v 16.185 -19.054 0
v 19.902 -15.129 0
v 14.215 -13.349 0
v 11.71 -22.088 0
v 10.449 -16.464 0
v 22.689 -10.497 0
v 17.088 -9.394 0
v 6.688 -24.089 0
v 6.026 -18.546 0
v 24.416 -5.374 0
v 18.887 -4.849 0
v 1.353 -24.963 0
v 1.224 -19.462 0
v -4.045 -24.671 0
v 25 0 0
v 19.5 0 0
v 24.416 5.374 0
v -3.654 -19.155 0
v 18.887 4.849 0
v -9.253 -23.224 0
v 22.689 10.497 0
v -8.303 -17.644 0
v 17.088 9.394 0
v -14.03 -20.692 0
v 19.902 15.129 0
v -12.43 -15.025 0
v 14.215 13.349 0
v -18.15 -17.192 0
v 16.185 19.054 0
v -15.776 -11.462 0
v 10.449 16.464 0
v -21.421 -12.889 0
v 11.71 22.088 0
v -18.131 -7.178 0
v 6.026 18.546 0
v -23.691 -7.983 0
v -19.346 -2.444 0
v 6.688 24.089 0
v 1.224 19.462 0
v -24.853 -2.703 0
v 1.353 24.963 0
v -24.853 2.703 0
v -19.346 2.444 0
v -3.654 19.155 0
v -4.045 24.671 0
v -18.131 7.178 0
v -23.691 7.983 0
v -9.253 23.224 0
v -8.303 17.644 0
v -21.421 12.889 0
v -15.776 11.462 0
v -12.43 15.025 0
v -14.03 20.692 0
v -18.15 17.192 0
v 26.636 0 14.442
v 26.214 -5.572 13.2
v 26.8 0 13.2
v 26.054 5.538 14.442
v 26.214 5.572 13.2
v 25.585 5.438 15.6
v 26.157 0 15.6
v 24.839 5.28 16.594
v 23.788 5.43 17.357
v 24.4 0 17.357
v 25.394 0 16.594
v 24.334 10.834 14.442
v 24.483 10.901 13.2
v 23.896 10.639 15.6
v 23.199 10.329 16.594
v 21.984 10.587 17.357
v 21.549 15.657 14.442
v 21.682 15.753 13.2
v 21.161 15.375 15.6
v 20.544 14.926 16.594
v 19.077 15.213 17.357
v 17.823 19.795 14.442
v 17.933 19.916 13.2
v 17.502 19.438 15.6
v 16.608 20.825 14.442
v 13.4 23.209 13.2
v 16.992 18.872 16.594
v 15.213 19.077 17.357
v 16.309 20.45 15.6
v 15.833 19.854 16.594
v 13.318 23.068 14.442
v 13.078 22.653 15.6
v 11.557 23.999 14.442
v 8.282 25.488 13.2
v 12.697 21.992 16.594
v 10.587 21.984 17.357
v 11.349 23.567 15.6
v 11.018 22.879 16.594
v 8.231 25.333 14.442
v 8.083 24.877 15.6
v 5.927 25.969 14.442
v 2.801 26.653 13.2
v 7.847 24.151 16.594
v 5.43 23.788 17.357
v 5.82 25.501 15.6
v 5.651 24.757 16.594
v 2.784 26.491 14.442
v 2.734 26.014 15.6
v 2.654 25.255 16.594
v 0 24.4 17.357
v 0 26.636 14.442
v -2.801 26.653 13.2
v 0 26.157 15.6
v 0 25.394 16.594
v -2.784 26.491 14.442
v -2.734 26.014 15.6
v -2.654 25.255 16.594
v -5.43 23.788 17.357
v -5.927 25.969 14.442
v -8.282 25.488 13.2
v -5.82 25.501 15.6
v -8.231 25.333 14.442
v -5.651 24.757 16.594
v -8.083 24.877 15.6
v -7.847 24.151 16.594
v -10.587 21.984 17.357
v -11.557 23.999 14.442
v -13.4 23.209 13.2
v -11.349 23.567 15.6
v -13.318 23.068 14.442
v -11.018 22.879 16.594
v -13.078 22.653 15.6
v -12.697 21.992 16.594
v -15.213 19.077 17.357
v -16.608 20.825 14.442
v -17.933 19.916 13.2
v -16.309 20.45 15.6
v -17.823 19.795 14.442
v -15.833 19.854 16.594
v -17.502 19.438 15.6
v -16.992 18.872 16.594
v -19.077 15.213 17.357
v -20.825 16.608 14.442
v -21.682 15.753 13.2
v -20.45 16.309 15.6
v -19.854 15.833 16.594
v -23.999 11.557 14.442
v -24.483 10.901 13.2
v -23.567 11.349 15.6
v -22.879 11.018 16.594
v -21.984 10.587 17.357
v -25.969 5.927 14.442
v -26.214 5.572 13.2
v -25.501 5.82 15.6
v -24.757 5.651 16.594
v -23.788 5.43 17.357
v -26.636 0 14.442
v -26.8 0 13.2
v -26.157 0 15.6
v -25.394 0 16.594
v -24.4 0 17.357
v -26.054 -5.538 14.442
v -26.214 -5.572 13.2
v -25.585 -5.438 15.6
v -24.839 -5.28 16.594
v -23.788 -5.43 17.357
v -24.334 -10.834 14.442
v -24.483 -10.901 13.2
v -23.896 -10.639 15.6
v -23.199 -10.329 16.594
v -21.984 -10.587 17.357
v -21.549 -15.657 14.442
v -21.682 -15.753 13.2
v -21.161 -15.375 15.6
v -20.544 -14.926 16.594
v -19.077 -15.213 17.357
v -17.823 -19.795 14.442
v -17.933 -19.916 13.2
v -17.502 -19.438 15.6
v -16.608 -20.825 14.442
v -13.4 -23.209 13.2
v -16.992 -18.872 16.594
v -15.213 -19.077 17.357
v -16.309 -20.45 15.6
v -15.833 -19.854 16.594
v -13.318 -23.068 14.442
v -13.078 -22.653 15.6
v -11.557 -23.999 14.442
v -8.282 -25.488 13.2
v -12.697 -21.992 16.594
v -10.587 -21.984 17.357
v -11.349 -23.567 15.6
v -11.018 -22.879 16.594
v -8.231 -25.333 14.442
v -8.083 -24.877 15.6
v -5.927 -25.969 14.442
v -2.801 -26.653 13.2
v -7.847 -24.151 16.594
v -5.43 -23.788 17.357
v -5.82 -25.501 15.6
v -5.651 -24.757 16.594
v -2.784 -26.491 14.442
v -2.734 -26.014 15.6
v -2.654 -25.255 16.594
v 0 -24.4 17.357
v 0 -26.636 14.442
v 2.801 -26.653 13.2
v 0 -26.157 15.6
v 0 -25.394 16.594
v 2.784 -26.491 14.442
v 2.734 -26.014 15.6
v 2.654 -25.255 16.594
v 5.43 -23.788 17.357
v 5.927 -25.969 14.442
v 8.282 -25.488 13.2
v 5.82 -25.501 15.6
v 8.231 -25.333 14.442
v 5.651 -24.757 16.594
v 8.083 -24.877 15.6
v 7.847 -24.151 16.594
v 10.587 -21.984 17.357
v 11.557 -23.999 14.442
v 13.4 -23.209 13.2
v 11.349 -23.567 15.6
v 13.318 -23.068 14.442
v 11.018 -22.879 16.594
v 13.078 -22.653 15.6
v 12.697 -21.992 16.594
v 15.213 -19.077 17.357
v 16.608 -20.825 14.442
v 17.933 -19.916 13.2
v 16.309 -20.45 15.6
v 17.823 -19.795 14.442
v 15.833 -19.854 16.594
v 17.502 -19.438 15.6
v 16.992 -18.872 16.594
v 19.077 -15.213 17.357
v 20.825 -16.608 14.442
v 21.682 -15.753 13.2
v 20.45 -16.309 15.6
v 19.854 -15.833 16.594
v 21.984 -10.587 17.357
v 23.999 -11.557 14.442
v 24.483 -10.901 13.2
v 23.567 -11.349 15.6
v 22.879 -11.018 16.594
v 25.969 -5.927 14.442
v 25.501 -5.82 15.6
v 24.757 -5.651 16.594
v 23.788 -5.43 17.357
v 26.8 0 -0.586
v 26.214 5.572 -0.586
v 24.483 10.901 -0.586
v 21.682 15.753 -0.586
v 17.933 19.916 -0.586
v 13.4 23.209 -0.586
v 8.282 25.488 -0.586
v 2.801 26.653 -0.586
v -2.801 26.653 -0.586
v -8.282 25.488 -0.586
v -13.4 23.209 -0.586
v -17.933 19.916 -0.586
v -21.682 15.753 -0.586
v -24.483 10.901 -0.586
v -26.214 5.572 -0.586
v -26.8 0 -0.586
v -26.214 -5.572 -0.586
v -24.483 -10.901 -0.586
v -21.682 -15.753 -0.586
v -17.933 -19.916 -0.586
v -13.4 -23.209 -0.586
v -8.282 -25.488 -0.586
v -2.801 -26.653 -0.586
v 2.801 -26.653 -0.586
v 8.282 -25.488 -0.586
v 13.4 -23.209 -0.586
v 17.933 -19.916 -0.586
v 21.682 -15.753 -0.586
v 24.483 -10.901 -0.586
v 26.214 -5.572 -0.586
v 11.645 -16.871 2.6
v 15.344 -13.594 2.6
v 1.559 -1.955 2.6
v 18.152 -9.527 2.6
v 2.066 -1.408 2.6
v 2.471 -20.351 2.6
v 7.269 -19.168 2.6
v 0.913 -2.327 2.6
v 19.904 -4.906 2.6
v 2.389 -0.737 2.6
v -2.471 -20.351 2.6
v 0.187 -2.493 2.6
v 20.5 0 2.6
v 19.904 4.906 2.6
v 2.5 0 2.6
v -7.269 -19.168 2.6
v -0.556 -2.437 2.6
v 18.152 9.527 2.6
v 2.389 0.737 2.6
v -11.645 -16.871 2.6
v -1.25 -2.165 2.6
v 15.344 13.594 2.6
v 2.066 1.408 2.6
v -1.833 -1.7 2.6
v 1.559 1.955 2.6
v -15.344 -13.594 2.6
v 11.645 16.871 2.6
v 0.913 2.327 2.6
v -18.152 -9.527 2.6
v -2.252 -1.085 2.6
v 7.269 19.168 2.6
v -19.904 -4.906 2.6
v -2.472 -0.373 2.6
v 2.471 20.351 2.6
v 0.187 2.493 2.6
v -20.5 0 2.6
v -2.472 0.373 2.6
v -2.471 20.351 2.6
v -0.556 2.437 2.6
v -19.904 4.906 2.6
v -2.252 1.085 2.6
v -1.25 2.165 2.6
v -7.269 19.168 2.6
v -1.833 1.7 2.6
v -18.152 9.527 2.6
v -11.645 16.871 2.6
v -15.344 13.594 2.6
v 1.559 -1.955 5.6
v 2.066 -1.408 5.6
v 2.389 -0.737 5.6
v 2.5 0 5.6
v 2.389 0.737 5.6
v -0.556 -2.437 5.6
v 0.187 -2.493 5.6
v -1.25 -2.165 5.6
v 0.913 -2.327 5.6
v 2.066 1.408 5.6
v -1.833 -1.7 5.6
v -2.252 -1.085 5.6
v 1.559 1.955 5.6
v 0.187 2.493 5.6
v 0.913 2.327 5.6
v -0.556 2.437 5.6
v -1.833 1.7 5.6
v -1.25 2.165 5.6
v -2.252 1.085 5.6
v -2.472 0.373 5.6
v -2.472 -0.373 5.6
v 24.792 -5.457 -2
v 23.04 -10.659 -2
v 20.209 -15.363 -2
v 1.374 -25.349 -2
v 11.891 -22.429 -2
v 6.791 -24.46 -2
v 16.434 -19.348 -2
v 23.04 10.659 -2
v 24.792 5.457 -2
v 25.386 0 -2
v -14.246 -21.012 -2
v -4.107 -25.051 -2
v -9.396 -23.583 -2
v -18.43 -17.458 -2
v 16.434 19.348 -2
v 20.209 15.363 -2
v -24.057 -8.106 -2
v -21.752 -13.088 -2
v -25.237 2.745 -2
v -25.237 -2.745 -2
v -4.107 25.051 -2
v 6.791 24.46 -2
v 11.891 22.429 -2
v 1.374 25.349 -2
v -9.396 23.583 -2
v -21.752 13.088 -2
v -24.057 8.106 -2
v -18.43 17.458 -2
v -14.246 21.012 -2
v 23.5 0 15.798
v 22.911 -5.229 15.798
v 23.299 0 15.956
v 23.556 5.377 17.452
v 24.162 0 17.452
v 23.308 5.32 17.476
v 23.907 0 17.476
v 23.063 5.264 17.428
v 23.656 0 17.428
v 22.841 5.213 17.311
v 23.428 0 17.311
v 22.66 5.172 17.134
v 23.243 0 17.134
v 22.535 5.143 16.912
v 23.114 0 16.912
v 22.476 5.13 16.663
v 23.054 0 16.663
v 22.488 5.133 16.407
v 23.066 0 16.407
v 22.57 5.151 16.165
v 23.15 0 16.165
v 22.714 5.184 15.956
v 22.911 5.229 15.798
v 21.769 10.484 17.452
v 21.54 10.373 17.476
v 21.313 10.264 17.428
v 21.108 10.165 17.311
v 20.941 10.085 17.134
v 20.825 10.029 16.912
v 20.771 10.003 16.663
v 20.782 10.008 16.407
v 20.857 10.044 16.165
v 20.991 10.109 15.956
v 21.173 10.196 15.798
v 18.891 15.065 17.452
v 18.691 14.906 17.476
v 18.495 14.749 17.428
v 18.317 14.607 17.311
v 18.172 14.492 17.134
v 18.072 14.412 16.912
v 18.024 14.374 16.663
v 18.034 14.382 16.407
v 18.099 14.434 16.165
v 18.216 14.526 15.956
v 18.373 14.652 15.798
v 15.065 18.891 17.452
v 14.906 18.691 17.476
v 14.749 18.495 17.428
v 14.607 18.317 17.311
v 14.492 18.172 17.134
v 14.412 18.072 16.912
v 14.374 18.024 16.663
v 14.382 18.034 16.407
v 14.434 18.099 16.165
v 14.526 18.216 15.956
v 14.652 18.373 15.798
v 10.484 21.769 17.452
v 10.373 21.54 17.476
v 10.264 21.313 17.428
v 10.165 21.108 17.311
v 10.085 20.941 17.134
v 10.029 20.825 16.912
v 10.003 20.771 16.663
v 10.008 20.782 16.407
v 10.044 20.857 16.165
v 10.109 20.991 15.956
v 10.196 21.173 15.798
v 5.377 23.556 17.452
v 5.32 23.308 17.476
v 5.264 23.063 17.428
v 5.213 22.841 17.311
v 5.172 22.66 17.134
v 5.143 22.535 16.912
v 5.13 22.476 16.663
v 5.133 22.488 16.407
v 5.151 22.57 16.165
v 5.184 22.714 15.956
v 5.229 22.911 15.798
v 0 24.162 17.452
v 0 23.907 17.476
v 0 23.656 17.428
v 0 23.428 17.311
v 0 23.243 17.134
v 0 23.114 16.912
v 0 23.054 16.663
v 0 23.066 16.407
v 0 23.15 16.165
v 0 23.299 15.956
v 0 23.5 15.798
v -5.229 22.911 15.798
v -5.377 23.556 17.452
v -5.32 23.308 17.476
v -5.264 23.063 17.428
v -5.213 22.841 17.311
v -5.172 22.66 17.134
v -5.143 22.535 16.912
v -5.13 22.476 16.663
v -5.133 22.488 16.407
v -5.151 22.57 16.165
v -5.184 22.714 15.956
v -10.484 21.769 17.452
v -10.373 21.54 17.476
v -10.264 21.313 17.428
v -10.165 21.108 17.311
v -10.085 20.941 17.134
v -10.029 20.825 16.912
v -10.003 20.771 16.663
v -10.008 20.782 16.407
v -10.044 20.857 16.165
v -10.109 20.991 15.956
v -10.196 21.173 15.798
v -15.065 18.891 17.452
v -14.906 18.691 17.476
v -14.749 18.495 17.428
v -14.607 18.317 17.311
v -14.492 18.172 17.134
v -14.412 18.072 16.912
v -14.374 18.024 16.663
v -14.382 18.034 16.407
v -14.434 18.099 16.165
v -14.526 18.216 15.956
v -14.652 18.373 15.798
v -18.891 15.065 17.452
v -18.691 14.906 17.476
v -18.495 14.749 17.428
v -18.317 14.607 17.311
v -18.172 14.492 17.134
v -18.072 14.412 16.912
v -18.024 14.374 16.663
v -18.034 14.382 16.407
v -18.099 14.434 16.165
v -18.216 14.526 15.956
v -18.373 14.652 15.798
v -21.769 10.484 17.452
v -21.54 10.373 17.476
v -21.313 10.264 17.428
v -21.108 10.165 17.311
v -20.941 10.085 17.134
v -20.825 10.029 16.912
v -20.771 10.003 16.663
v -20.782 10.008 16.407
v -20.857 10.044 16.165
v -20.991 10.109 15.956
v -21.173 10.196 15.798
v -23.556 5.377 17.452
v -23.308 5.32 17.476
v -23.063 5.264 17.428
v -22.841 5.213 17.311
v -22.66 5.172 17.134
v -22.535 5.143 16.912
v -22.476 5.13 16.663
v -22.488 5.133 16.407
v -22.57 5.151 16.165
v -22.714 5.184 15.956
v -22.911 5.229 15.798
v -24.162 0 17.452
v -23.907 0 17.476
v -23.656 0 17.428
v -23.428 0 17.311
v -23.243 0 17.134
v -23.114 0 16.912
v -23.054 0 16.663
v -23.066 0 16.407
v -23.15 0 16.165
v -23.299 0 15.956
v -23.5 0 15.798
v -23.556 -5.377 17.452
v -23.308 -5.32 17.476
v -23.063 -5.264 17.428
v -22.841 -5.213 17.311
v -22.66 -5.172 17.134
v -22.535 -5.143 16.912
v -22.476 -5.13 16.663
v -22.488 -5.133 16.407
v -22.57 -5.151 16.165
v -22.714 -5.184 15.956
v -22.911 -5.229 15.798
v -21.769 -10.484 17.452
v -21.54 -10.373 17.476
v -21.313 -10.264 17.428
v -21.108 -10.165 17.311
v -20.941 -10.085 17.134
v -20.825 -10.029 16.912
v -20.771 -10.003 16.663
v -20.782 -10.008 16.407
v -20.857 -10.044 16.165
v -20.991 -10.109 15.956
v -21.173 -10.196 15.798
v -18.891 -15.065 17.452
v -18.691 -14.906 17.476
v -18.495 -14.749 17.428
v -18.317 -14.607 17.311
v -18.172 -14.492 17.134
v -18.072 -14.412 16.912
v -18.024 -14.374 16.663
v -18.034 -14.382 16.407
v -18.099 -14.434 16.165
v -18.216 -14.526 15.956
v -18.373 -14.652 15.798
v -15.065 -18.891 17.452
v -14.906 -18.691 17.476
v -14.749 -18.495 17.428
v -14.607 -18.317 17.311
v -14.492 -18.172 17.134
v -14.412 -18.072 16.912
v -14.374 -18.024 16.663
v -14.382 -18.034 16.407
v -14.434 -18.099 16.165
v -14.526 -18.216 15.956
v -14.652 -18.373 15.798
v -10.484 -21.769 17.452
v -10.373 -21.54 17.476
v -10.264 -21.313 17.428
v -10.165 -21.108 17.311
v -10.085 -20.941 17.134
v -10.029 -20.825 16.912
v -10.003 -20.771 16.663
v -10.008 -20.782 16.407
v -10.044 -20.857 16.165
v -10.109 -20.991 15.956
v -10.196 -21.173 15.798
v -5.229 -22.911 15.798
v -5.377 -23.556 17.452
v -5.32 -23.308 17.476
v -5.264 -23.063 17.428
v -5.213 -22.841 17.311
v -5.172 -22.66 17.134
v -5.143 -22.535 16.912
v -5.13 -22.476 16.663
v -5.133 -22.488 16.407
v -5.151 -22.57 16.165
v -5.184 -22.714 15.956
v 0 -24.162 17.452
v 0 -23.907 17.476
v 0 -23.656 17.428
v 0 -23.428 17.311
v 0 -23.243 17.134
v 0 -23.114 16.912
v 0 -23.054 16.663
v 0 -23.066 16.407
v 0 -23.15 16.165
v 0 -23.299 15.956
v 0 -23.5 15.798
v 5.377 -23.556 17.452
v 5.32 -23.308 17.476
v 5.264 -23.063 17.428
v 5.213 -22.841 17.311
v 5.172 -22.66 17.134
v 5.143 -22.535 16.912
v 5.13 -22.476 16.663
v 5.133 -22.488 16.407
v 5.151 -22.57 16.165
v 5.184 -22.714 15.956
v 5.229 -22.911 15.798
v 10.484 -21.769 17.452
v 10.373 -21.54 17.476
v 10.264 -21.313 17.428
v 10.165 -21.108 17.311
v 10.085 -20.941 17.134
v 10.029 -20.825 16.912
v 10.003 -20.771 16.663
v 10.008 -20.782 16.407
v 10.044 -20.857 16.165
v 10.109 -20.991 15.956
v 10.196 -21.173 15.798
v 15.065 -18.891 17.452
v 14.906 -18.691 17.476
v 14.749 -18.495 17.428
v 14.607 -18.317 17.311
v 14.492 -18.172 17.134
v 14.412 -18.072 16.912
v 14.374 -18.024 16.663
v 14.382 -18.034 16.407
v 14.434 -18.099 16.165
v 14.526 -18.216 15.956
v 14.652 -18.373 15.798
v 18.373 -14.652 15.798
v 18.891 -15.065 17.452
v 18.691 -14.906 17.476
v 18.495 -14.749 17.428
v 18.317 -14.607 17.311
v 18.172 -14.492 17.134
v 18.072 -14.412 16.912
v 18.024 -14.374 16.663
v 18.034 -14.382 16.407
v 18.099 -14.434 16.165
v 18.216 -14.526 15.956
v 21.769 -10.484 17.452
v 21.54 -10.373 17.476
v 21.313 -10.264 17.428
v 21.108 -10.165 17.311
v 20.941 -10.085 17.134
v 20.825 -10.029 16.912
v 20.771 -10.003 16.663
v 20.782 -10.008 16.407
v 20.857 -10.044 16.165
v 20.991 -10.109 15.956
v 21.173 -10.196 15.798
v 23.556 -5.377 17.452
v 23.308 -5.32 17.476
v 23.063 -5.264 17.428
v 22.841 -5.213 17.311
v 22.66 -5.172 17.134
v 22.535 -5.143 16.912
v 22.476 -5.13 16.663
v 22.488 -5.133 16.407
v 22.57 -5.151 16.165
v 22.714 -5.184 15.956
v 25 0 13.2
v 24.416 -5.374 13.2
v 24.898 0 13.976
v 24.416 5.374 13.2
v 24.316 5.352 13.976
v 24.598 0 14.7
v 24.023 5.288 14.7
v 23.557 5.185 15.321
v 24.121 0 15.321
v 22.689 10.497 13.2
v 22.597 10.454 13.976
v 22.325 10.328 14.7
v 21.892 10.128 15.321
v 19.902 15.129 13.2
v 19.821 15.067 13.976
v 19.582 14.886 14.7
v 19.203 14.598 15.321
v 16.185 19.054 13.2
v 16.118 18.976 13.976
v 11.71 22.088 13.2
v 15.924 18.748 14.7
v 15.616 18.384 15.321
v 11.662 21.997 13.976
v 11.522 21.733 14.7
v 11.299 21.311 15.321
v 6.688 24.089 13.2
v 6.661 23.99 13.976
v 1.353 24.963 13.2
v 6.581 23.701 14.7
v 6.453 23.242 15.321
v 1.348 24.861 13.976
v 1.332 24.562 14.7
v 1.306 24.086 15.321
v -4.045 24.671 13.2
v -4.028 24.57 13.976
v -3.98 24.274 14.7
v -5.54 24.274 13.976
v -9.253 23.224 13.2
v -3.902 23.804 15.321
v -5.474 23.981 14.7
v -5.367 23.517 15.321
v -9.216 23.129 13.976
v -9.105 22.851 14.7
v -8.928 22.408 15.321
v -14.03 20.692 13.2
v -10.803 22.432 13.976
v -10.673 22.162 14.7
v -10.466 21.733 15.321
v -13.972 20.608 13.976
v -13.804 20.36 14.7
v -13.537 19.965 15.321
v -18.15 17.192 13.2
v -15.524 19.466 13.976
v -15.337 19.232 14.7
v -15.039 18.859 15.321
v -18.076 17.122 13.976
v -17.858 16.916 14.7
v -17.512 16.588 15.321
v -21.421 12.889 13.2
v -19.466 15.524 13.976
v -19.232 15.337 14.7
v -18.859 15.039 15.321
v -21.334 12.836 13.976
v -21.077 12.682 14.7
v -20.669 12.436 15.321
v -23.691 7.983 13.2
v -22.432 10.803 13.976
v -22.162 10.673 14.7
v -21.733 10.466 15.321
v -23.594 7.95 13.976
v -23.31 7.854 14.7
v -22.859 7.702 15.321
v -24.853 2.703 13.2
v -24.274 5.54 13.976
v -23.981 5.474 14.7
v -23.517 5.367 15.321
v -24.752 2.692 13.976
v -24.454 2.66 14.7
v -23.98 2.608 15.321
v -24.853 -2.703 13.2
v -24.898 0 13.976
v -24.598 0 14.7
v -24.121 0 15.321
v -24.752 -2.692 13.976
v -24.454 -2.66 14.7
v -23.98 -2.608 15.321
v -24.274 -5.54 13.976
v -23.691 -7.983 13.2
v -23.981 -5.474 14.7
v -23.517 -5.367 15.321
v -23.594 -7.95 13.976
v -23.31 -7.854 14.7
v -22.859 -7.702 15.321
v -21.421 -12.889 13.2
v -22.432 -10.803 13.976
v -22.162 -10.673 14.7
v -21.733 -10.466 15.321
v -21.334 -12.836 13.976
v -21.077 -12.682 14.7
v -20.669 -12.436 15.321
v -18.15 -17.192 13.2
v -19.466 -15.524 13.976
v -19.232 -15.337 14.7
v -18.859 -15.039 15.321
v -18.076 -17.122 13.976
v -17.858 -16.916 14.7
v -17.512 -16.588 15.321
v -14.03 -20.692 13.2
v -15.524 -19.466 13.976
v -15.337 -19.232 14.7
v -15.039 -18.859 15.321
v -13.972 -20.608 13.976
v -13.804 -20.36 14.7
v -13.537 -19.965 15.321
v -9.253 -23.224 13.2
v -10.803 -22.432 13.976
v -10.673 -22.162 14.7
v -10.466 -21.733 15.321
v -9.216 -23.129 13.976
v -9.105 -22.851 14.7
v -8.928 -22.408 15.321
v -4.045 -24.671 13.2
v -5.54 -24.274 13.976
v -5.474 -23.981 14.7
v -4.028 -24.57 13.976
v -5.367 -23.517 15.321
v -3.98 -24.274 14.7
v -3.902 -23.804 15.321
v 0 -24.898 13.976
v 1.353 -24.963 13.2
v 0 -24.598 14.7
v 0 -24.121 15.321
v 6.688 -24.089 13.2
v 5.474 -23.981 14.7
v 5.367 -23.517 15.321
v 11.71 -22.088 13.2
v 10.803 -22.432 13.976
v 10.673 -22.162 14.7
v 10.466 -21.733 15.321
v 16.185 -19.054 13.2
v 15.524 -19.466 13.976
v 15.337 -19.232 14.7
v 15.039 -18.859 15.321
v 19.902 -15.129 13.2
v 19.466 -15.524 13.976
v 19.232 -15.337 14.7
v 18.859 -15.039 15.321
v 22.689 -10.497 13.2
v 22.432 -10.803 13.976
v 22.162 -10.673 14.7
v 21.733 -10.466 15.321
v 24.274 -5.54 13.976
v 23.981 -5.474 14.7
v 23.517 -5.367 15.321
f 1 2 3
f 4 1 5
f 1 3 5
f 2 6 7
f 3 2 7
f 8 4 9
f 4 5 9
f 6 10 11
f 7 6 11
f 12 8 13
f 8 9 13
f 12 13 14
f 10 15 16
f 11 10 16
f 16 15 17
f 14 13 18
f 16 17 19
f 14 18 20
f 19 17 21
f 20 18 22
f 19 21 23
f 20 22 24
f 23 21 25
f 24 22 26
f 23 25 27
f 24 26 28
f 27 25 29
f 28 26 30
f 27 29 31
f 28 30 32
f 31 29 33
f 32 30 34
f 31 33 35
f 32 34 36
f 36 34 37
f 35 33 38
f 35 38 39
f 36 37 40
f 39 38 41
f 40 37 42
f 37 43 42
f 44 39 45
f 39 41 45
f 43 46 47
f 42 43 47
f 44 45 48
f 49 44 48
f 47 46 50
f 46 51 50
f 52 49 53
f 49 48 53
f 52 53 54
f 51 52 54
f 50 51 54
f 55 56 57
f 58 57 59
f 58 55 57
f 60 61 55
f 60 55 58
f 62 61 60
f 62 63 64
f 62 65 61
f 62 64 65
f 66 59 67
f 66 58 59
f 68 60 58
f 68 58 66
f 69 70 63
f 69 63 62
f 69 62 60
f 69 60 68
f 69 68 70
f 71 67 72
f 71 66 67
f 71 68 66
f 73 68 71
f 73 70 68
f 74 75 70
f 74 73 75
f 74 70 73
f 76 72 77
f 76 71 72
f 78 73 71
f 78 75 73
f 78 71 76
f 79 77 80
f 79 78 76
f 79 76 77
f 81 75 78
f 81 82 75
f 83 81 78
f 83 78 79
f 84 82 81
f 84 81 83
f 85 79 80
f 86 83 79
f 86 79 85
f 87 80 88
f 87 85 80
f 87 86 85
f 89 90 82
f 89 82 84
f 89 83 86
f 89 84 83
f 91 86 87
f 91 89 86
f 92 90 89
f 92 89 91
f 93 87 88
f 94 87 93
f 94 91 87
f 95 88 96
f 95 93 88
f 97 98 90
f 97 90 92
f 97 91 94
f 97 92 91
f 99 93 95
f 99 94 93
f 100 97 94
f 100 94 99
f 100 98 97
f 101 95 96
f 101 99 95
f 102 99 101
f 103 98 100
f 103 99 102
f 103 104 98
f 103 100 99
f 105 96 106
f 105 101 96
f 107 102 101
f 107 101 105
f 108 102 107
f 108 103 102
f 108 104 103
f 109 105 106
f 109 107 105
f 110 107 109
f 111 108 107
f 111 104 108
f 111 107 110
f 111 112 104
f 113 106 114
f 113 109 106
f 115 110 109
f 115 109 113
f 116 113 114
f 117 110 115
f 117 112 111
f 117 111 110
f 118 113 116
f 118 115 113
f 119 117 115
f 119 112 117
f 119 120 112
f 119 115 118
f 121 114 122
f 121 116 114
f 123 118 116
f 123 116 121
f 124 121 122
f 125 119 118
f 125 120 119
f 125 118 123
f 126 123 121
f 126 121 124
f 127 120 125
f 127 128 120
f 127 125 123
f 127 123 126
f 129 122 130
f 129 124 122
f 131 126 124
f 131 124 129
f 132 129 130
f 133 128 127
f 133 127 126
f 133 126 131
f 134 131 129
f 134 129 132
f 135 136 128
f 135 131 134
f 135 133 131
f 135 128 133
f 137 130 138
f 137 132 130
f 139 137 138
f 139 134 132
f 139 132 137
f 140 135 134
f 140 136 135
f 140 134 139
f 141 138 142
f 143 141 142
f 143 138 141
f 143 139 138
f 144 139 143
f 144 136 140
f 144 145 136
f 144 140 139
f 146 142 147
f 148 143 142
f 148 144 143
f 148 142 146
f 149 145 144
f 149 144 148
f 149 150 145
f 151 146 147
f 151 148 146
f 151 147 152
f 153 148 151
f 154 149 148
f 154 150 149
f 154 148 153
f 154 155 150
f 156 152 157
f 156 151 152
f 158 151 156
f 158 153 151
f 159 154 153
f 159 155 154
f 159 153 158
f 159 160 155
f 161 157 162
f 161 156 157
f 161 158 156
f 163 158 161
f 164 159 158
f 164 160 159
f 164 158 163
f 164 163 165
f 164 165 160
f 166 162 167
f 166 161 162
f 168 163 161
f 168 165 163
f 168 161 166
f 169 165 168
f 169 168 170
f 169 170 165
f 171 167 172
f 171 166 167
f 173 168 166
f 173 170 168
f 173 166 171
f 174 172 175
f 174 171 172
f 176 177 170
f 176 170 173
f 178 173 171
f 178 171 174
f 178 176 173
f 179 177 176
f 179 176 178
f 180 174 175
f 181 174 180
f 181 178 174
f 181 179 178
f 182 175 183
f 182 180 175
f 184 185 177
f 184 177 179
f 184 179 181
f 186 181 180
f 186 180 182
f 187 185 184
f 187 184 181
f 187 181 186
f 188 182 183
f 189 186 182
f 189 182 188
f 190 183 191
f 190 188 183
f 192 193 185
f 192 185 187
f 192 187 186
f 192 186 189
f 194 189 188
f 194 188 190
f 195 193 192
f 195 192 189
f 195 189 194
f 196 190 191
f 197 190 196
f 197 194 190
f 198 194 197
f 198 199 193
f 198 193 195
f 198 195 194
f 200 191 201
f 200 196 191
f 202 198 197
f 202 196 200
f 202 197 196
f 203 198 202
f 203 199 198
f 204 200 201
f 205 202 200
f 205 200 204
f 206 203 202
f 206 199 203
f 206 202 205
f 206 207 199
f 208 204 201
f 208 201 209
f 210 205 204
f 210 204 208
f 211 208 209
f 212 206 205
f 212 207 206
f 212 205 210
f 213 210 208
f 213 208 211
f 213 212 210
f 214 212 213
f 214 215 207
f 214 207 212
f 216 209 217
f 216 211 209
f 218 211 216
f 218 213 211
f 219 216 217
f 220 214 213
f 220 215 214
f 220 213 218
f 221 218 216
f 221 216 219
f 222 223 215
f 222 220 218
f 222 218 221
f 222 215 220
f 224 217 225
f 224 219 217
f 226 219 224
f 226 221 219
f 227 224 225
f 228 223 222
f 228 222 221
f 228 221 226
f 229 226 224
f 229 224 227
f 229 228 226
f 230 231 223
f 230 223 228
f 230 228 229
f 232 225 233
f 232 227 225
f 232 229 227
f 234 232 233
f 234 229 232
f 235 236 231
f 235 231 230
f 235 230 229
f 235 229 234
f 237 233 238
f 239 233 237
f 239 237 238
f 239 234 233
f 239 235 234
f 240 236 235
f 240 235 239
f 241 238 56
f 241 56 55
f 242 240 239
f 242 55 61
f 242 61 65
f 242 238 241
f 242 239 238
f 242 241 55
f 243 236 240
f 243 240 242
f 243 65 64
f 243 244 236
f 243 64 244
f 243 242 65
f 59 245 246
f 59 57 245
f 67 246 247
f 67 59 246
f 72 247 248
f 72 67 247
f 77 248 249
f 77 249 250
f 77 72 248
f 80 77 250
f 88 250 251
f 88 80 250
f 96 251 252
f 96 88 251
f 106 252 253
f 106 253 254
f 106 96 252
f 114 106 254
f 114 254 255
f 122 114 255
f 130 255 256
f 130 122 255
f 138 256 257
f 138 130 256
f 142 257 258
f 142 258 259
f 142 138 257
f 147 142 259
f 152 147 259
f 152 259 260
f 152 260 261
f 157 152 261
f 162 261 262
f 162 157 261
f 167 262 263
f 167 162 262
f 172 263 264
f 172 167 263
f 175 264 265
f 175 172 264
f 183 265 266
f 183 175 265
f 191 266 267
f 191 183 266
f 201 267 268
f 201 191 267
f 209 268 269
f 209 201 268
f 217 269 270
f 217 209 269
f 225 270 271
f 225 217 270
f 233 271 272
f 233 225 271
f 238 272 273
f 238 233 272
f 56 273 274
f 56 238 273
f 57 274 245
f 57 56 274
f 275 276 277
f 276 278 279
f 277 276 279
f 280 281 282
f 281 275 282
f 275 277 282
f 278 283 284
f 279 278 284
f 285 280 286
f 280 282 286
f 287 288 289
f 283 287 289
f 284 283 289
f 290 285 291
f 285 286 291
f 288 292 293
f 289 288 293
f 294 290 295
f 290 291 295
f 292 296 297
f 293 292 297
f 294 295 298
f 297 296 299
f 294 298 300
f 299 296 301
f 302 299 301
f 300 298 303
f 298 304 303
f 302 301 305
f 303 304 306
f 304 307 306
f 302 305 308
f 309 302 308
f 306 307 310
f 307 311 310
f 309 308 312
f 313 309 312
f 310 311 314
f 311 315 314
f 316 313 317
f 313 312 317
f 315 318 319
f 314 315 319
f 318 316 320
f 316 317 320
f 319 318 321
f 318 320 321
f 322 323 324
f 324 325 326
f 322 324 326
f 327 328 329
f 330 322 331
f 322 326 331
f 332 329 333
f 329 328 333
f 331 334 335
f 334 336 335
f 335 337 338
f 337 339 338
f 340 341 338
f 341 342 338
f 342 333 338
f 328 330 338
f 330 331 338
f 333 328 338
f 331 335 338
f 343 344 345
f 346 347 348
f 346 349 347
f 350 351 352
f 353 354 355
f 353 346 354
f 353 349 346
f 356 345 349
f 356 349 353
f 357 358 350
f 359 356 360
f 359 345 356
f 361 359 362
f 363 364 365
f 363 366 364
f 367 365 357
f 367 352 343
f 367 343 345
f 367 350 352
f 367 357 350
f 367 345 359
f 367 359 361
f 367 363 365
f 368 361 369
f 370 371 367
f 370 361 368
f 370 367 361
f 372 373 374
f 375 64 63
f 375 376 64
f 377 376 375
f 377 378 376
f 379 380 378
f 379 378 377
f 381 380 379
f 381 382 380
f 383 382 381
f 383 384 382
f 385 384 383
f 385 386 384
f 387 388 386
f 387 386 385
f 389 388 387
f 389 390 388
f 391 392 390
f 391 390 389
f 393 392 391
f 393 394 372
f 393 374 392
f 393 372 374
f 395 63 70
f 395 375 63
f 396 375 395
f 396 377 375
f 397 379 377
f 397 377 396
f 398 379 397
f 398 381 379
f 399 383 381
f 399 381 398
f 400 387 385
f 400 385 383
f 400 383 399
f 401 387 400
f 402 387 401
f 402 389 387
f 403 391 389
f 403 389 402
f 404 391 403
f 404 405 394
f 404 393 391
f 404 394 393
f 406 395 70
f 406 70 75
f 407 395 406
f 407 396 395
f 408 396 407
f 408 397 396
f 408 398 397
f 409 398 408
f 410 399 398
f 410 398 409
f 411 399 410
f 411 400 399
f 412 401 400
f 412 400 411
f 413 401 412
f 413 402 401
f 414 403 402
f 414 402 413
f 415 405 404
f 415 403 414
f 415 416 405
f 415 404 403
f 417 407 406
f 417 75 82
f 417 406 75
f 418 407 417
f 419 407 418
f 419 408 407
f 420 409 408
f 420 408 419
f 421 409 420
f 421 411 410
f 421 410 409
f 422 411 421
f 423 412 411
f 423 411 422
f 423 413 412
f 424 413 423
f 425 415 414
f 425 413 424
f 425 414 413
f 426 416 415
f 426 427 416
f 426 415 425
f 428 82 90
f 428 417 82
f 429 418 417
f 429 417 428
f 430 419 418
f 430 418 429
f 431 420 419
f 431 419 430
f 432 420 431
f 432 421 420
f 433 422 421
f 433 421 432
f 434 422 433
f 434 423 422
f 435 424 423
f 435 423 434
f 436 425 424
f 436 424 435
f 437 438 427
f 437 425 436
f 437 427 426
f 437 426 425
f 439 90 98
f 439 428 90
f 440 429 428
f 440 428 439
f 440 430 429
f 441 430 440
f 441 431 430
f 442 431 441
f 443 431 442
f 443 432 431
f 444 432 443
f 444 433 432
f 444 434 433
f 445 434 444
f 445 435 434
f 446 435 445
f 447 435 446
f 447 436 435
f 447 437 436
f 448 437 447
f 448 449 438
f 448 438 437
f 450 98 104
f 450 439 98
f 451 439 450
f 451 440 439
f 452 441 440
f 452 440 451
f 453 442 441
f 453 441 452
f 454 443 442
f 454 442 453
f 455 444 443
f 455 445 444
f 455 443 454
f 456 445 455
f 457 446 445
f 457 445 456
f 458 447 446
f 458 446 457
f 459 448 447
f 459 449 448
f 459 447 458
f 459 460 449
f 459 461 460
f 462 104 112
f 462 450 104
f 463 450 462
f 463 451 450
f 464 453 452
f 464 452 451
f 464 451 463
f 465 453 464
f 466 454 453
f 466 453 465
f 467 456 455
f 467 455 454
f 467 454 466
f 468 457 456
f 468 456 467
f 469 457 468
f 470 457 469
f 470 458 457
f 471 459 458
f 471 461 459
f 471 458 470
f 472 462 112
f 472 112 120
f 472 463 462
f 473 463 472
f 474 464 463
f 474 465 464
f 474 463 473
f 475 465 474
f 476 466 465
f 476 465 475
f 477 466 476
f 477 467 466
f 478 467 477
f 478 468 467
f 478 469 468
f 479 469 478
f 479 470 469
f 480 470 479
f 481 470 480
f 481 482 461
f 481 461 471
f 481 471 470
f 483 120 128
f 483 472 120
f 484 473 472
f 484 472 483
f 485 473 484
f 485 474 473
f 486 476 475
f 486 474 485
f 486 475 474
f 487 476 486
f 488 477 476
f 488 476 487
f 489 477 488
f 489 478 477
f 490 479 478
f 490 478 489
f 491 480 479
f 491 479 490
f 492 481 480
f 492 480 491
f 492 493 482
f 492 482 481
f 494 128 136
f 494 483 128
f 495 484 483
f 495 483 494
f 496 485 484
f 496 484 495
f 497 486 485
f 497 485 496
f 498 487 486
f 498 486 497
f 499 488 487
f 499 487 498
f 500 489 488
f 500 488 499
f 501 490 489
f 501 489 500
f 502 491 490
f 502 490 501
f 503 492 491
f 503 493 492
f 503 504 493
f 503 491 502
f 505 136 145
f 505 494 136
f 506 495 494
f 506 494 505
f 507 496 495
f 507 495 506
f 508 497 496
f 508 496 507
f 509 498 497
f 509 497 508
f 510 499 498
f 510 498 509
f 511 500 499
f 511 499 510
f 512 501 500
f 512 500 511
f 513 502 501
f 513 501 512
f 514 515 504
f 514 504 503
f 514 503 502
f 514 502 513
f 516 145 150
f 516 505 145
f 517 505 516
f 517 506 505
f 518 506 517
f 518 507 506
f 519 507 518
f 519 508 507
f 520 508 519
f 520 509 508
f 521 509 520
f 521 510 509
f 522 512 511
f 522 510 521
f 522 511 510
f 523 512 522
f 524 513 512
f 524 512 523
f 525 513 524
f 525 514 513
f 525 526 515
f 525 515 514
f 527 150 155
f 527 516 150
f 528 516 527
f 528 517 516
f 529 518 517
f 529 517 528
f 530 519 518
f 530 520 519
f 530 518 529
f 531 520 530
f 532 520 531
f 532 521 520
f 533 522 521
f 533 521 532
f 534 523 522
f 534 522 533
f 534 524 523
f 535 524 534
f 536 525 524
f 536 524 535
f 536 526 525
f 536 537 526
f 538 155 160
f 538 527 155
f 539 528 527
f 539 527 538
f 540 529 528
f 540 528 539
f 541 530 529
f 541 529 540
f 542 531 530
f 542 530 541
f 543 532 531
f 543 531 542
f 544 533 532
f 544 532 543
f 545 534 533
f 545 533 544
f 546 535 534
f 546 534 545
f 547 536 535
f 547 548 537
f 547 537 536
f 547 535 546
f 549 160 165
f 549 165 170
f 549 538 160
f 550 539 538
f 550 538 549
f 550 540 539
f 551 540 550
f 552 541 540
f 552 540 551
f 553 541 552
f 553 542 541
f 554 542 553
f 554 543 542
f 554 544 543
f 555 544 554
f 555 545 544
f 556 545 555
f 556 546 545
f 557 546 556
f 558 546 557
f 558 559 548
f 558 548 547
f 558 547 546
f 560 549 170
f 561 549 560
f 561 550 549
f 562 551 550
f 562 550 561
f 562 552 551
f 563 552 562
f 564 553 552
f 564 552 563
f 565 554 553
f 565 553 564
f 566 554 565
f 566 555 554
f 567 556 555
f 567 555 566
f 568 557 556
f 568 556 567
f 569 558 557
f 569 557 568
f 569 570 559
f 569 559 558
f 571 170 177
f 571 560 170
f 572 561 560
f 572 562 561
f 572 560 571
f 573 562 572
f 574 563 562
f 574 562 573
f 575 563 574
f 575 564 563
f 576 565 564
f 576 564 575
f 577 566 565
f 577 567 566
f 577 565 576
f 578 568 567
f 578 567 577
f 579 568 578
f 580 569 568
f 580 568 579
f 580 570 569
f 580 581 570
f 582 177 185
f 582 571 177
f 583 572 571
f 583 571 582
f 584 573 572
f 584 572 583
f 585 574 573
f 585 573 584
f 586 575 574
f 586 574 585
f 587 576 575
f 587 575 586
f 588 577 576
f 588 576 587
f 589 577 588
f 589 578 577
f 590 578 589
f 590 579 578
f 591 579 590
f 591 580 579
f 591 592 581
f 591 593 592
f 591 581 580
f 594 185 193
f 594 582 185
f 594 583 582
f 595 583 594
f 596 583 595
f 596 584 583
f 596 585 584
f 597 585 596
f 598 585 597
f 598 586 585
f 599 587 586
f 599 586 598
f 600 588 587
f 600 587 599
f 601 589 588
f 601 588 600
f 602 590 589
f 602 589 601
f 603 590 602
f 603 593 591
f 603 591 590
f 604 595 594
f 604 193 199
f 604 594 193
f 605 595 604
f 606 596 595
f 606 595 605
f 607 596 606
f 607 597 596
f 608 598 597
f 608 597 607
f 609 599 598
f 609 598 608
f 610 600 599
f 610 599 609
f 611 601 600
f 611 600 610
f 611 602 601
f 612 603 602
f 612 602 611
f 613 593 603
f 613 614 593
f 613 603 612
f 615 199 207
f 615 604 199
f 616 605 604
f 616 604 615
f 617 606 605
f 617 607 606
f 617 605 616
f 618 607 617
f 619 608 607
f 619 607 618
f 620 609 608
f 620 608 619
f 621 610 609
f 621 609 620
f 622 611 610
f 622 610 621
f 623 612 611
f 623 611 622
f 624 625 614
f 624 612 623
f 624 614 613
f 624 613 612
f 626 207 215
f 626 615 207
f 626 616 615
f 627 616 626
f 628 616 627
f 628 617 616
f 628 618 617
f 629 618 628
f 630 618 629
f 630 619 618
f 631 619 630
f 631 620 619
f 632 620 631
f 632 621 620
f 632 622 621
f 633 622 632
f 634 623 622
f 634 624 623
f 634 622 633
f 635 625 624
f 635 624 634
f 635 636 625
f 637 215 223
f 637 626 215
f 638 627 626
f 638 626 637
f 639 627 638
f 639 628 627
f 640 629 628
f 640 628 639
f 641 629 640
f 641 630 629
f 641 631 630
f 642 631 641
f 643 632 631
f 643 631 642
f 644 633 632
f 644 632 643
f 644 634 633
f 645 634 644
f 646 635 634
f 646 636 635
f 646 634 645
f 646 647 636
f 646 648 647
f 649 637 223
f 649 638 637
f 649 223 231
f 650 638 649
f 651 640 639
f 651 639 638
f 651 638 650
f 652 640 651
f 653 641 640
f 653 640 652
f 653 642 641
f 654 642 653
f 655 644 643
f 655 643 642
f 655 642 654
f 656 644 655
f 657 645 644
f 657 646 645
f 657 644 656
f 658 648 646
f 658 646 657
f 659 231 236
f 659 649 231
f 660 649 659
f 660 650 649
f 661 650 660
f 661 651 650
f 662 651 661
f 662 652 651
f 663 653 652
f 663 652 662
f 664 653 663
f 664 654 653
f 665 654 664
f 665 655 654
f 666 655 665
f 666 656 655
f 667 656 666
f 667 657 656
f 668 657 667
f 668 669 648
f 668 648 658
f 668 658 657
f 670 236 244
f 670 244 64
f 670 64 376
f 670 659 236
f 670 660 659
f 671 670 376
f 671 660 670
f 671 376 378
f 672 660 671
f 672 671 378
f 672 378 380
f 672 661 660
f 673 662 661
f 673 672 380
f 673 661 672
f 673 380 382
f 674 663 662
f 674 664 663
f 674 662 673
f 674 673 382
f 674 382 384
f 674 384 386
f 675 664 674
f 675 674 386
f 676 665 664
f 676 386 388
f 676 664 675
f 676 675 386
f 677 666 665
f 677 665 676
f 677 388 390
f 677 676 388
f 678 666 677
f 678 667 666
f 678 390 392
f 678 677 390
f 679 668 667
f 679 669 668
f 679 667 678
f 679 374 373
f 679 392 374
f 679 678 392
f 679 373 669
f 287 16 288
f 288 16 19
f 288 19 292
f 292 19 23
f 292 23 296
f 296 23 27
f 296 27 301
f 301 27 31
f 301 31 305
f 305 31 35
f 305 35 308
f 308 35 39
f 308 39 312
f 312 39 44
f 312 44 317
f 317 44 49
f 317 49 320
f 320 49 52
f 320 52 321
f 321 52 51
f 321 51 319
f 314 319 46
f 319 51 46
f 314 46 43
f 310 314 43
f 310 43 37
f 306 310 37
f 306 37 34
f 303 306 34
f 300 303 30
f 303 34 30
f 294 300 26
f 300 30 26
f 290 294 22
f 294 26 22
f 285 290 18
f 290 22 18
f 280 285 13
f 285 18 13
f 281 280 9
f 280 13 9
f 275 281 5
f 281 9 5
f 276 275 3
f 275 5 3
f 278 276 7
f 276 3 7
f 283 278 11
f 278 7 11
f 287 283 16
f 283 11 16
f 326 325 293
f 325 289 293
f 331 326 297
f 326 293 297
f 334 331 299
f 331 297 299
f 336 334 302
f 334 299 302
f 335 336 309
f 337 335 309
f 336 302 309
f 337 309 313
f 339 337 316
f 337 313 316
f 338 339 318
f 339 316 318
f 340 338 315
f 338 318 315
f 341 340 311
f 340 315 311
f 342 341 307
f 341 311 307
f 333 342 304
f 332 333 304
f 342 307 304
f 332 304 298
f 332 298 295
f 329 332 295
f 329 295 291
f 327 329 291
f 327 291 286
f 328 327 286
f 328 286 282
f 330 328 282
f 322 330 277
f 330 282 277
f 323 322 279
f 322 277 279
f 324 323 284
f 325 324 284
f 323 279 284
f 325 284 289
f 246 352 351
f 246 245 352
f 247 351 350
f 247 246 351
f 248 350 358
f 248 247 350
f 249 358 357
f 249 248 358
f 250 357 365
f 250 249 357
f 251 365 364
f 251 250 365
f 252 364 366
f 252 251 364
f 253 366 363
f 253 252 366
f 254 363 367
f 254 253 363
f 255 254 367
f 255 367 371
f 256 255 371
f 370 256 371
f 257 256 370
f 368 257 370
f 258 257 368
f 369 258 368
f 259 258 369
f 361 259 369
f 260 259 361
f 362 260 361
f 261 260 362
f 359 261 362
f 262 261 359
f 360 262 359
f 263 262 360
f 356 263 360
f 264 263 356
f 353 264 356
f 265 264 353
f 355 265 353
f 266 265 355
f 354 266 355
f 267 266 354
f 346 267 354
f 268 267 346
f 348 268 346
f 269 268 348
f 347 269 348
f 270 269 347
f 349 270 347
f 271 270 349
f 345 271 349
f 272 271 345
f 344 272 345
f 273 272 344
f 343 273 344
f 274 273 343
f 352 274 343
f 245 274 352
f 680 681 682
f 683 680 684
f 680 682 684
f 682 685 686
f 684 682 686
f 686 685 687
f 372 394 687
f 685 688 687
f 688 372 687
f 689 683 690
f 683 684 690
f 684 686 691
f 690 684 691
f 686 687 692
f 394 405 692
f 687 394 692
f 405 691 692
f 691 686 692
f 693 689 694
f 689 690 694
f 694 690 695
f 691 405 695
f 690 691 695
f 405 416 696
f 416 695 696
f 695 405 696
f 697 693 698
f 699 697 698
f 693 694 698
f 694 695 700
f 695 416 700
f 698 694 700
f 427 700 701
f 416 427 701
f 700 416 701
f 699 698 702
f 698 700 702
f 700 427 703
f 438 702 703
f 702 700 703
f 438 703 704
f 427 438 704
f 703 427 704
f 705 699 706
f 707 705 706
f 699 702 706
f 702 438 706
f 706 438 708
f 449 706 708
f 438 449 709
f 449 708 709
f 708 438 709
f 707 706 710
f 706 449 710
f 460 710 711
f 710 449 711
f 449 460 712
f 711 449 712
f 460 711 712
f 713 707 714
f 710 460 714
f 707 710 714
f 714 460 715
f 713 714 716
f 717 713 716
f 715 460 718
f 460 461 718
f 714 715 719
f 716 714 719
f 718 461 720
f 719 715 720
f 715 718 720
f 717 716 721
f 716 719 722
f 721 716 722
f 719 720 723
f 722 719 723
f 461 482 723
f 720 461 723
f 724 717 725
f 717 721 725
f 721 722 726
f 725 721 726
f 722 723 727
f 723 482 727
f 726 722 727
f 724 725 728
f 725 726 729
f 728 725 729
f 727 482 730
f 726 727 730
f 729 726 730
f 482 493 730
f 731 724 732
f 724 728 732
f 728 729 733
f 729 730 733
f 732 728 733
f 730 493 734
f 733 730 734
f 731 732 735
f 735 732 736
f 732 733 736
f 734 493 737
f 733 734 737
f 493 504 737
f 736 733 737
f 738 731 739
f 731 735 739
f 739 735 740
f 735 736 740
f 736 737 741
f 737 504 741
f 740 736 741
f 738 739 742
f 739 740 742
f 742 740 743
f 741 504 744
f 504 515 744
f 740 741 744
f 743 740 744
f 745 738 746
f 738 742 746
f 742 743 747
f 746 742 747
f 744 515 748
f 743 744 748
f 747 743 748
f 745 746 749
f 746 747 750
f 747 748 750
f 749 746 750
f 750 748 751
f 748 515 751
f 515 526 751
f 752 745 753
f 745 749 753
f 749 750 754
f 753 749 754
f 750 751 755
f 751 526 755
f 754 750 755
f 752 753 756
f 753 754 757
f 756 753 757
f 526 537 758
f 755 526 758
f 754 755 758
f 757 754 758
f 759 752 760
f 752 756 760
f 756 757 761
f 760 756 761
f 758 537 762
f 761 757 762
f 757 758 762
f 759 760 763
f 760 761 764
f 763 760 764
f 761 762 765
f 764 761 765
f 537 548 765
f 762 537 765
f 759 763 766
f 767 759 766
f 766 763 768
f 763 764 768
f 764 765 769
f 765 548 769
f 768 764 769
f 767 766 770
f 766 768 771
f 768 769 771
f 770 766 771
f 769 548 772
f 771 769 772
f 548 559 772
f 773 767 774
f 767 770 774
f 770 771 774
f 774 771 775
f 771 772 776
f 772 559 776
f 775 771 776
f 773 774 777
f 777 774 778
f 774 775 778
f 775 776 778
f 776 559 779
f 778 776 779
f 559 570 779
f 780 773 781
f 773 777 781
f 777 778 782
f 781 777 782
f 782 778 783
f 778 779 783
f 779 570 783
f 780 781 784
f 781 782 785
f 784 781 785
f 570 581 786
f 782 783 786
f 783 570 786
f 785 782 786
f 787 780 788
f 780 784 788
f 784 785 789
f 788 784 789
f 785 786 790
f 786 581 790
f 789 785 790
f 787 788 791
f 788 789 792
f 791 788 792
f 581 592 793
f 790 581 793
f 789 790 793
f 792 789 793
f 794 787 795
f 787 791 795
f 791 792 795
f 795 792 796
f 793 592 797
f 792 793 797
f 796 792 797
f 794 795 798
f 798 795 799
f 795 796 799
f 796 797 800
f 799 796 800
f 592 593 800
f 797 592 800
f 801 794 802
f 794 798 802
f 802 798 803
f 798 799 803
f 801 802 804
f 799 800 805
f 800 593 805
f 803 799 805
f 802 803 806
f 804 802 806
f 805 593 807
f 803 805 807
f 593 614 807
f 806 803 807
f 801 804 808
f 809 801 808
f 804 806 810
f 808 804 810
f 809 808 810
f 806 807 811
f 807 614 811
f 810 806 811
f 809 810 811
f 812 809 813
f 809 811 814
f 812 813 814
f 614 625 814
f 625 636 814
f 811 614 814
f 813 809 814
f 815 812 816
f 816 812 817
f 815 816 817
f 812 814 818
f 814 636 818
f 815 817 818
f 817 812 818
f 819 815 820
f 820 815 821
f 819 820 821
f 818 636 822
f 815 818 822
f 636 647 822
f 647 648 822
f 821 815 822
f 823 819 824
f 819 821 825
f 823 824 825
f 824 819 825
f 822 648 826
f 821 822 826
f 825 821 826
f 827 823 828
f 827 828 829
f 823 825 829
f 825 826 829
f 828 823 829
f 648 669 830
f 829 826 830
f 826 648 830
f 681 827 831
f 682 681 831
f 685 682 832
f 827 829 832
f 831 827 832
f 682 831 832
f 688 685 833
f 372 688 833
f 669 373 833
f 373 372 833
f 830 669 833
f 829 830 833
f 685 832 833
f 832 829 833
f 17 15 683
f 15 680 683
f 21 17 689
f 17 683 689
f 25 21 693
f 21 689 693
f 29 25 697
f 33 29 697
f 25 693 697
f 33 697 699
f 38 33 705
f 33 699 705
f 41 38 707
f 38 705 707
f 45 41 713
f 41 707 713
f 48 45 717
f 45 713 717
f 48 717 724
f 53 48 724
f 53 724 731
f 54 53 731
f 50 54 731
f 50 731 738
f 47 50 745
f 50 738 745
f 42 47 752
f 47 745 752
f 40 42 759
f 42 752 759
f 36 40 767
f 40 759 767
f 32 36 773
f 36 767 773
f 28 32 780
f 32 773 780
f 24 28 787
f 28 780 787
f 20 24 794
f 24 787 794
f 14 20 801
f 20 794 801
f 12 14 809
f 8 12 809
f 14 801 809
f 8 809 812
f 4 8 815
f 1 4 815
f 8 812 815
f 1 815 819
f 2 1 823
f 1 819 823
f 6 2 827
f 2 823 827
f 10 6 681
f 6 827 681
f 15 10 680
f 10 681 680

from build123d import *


with BuildPart() as part:
    # Sketch → Revolution (revolve)
    with BuildSketch(Plane.XZ):
        with BuildLine():
            Line((0, 5.6), (2.5, 5.6))
            Line((2.5, 5.6), (2.5, 2.6))
            Line((2.5, 2.6), (20.5, 2.6))
            Line((20.5, 2.6), (19.5, 0))
            Line((19.5, 0), (25, 0))
            Line((25, 0), (25, 13.2))
            ThreePointArc((25, 13.2), (24.598076, 14.7), (23.5, 15.798076))
            ThreePointArc((24.400016, 17.356913), (23.170591, 17.027501), (23.5, 15.798076))
            ThreePointArc((26.8, 13.2), (26.156926, 15.599992), (24.400016, 17.356913))
            Line((26.8, -0.585786), (26.8, 13.2))
            Line((25.385786, -2), (26.8, -0.585786))
            Line((0, -2), (25.385786, -2))
            Line((0, 5.6), (0, -2))
        make_face()
    revolve(axis=Axis((0, 0, 0), (0, 0, 1)))


solid = part.part
